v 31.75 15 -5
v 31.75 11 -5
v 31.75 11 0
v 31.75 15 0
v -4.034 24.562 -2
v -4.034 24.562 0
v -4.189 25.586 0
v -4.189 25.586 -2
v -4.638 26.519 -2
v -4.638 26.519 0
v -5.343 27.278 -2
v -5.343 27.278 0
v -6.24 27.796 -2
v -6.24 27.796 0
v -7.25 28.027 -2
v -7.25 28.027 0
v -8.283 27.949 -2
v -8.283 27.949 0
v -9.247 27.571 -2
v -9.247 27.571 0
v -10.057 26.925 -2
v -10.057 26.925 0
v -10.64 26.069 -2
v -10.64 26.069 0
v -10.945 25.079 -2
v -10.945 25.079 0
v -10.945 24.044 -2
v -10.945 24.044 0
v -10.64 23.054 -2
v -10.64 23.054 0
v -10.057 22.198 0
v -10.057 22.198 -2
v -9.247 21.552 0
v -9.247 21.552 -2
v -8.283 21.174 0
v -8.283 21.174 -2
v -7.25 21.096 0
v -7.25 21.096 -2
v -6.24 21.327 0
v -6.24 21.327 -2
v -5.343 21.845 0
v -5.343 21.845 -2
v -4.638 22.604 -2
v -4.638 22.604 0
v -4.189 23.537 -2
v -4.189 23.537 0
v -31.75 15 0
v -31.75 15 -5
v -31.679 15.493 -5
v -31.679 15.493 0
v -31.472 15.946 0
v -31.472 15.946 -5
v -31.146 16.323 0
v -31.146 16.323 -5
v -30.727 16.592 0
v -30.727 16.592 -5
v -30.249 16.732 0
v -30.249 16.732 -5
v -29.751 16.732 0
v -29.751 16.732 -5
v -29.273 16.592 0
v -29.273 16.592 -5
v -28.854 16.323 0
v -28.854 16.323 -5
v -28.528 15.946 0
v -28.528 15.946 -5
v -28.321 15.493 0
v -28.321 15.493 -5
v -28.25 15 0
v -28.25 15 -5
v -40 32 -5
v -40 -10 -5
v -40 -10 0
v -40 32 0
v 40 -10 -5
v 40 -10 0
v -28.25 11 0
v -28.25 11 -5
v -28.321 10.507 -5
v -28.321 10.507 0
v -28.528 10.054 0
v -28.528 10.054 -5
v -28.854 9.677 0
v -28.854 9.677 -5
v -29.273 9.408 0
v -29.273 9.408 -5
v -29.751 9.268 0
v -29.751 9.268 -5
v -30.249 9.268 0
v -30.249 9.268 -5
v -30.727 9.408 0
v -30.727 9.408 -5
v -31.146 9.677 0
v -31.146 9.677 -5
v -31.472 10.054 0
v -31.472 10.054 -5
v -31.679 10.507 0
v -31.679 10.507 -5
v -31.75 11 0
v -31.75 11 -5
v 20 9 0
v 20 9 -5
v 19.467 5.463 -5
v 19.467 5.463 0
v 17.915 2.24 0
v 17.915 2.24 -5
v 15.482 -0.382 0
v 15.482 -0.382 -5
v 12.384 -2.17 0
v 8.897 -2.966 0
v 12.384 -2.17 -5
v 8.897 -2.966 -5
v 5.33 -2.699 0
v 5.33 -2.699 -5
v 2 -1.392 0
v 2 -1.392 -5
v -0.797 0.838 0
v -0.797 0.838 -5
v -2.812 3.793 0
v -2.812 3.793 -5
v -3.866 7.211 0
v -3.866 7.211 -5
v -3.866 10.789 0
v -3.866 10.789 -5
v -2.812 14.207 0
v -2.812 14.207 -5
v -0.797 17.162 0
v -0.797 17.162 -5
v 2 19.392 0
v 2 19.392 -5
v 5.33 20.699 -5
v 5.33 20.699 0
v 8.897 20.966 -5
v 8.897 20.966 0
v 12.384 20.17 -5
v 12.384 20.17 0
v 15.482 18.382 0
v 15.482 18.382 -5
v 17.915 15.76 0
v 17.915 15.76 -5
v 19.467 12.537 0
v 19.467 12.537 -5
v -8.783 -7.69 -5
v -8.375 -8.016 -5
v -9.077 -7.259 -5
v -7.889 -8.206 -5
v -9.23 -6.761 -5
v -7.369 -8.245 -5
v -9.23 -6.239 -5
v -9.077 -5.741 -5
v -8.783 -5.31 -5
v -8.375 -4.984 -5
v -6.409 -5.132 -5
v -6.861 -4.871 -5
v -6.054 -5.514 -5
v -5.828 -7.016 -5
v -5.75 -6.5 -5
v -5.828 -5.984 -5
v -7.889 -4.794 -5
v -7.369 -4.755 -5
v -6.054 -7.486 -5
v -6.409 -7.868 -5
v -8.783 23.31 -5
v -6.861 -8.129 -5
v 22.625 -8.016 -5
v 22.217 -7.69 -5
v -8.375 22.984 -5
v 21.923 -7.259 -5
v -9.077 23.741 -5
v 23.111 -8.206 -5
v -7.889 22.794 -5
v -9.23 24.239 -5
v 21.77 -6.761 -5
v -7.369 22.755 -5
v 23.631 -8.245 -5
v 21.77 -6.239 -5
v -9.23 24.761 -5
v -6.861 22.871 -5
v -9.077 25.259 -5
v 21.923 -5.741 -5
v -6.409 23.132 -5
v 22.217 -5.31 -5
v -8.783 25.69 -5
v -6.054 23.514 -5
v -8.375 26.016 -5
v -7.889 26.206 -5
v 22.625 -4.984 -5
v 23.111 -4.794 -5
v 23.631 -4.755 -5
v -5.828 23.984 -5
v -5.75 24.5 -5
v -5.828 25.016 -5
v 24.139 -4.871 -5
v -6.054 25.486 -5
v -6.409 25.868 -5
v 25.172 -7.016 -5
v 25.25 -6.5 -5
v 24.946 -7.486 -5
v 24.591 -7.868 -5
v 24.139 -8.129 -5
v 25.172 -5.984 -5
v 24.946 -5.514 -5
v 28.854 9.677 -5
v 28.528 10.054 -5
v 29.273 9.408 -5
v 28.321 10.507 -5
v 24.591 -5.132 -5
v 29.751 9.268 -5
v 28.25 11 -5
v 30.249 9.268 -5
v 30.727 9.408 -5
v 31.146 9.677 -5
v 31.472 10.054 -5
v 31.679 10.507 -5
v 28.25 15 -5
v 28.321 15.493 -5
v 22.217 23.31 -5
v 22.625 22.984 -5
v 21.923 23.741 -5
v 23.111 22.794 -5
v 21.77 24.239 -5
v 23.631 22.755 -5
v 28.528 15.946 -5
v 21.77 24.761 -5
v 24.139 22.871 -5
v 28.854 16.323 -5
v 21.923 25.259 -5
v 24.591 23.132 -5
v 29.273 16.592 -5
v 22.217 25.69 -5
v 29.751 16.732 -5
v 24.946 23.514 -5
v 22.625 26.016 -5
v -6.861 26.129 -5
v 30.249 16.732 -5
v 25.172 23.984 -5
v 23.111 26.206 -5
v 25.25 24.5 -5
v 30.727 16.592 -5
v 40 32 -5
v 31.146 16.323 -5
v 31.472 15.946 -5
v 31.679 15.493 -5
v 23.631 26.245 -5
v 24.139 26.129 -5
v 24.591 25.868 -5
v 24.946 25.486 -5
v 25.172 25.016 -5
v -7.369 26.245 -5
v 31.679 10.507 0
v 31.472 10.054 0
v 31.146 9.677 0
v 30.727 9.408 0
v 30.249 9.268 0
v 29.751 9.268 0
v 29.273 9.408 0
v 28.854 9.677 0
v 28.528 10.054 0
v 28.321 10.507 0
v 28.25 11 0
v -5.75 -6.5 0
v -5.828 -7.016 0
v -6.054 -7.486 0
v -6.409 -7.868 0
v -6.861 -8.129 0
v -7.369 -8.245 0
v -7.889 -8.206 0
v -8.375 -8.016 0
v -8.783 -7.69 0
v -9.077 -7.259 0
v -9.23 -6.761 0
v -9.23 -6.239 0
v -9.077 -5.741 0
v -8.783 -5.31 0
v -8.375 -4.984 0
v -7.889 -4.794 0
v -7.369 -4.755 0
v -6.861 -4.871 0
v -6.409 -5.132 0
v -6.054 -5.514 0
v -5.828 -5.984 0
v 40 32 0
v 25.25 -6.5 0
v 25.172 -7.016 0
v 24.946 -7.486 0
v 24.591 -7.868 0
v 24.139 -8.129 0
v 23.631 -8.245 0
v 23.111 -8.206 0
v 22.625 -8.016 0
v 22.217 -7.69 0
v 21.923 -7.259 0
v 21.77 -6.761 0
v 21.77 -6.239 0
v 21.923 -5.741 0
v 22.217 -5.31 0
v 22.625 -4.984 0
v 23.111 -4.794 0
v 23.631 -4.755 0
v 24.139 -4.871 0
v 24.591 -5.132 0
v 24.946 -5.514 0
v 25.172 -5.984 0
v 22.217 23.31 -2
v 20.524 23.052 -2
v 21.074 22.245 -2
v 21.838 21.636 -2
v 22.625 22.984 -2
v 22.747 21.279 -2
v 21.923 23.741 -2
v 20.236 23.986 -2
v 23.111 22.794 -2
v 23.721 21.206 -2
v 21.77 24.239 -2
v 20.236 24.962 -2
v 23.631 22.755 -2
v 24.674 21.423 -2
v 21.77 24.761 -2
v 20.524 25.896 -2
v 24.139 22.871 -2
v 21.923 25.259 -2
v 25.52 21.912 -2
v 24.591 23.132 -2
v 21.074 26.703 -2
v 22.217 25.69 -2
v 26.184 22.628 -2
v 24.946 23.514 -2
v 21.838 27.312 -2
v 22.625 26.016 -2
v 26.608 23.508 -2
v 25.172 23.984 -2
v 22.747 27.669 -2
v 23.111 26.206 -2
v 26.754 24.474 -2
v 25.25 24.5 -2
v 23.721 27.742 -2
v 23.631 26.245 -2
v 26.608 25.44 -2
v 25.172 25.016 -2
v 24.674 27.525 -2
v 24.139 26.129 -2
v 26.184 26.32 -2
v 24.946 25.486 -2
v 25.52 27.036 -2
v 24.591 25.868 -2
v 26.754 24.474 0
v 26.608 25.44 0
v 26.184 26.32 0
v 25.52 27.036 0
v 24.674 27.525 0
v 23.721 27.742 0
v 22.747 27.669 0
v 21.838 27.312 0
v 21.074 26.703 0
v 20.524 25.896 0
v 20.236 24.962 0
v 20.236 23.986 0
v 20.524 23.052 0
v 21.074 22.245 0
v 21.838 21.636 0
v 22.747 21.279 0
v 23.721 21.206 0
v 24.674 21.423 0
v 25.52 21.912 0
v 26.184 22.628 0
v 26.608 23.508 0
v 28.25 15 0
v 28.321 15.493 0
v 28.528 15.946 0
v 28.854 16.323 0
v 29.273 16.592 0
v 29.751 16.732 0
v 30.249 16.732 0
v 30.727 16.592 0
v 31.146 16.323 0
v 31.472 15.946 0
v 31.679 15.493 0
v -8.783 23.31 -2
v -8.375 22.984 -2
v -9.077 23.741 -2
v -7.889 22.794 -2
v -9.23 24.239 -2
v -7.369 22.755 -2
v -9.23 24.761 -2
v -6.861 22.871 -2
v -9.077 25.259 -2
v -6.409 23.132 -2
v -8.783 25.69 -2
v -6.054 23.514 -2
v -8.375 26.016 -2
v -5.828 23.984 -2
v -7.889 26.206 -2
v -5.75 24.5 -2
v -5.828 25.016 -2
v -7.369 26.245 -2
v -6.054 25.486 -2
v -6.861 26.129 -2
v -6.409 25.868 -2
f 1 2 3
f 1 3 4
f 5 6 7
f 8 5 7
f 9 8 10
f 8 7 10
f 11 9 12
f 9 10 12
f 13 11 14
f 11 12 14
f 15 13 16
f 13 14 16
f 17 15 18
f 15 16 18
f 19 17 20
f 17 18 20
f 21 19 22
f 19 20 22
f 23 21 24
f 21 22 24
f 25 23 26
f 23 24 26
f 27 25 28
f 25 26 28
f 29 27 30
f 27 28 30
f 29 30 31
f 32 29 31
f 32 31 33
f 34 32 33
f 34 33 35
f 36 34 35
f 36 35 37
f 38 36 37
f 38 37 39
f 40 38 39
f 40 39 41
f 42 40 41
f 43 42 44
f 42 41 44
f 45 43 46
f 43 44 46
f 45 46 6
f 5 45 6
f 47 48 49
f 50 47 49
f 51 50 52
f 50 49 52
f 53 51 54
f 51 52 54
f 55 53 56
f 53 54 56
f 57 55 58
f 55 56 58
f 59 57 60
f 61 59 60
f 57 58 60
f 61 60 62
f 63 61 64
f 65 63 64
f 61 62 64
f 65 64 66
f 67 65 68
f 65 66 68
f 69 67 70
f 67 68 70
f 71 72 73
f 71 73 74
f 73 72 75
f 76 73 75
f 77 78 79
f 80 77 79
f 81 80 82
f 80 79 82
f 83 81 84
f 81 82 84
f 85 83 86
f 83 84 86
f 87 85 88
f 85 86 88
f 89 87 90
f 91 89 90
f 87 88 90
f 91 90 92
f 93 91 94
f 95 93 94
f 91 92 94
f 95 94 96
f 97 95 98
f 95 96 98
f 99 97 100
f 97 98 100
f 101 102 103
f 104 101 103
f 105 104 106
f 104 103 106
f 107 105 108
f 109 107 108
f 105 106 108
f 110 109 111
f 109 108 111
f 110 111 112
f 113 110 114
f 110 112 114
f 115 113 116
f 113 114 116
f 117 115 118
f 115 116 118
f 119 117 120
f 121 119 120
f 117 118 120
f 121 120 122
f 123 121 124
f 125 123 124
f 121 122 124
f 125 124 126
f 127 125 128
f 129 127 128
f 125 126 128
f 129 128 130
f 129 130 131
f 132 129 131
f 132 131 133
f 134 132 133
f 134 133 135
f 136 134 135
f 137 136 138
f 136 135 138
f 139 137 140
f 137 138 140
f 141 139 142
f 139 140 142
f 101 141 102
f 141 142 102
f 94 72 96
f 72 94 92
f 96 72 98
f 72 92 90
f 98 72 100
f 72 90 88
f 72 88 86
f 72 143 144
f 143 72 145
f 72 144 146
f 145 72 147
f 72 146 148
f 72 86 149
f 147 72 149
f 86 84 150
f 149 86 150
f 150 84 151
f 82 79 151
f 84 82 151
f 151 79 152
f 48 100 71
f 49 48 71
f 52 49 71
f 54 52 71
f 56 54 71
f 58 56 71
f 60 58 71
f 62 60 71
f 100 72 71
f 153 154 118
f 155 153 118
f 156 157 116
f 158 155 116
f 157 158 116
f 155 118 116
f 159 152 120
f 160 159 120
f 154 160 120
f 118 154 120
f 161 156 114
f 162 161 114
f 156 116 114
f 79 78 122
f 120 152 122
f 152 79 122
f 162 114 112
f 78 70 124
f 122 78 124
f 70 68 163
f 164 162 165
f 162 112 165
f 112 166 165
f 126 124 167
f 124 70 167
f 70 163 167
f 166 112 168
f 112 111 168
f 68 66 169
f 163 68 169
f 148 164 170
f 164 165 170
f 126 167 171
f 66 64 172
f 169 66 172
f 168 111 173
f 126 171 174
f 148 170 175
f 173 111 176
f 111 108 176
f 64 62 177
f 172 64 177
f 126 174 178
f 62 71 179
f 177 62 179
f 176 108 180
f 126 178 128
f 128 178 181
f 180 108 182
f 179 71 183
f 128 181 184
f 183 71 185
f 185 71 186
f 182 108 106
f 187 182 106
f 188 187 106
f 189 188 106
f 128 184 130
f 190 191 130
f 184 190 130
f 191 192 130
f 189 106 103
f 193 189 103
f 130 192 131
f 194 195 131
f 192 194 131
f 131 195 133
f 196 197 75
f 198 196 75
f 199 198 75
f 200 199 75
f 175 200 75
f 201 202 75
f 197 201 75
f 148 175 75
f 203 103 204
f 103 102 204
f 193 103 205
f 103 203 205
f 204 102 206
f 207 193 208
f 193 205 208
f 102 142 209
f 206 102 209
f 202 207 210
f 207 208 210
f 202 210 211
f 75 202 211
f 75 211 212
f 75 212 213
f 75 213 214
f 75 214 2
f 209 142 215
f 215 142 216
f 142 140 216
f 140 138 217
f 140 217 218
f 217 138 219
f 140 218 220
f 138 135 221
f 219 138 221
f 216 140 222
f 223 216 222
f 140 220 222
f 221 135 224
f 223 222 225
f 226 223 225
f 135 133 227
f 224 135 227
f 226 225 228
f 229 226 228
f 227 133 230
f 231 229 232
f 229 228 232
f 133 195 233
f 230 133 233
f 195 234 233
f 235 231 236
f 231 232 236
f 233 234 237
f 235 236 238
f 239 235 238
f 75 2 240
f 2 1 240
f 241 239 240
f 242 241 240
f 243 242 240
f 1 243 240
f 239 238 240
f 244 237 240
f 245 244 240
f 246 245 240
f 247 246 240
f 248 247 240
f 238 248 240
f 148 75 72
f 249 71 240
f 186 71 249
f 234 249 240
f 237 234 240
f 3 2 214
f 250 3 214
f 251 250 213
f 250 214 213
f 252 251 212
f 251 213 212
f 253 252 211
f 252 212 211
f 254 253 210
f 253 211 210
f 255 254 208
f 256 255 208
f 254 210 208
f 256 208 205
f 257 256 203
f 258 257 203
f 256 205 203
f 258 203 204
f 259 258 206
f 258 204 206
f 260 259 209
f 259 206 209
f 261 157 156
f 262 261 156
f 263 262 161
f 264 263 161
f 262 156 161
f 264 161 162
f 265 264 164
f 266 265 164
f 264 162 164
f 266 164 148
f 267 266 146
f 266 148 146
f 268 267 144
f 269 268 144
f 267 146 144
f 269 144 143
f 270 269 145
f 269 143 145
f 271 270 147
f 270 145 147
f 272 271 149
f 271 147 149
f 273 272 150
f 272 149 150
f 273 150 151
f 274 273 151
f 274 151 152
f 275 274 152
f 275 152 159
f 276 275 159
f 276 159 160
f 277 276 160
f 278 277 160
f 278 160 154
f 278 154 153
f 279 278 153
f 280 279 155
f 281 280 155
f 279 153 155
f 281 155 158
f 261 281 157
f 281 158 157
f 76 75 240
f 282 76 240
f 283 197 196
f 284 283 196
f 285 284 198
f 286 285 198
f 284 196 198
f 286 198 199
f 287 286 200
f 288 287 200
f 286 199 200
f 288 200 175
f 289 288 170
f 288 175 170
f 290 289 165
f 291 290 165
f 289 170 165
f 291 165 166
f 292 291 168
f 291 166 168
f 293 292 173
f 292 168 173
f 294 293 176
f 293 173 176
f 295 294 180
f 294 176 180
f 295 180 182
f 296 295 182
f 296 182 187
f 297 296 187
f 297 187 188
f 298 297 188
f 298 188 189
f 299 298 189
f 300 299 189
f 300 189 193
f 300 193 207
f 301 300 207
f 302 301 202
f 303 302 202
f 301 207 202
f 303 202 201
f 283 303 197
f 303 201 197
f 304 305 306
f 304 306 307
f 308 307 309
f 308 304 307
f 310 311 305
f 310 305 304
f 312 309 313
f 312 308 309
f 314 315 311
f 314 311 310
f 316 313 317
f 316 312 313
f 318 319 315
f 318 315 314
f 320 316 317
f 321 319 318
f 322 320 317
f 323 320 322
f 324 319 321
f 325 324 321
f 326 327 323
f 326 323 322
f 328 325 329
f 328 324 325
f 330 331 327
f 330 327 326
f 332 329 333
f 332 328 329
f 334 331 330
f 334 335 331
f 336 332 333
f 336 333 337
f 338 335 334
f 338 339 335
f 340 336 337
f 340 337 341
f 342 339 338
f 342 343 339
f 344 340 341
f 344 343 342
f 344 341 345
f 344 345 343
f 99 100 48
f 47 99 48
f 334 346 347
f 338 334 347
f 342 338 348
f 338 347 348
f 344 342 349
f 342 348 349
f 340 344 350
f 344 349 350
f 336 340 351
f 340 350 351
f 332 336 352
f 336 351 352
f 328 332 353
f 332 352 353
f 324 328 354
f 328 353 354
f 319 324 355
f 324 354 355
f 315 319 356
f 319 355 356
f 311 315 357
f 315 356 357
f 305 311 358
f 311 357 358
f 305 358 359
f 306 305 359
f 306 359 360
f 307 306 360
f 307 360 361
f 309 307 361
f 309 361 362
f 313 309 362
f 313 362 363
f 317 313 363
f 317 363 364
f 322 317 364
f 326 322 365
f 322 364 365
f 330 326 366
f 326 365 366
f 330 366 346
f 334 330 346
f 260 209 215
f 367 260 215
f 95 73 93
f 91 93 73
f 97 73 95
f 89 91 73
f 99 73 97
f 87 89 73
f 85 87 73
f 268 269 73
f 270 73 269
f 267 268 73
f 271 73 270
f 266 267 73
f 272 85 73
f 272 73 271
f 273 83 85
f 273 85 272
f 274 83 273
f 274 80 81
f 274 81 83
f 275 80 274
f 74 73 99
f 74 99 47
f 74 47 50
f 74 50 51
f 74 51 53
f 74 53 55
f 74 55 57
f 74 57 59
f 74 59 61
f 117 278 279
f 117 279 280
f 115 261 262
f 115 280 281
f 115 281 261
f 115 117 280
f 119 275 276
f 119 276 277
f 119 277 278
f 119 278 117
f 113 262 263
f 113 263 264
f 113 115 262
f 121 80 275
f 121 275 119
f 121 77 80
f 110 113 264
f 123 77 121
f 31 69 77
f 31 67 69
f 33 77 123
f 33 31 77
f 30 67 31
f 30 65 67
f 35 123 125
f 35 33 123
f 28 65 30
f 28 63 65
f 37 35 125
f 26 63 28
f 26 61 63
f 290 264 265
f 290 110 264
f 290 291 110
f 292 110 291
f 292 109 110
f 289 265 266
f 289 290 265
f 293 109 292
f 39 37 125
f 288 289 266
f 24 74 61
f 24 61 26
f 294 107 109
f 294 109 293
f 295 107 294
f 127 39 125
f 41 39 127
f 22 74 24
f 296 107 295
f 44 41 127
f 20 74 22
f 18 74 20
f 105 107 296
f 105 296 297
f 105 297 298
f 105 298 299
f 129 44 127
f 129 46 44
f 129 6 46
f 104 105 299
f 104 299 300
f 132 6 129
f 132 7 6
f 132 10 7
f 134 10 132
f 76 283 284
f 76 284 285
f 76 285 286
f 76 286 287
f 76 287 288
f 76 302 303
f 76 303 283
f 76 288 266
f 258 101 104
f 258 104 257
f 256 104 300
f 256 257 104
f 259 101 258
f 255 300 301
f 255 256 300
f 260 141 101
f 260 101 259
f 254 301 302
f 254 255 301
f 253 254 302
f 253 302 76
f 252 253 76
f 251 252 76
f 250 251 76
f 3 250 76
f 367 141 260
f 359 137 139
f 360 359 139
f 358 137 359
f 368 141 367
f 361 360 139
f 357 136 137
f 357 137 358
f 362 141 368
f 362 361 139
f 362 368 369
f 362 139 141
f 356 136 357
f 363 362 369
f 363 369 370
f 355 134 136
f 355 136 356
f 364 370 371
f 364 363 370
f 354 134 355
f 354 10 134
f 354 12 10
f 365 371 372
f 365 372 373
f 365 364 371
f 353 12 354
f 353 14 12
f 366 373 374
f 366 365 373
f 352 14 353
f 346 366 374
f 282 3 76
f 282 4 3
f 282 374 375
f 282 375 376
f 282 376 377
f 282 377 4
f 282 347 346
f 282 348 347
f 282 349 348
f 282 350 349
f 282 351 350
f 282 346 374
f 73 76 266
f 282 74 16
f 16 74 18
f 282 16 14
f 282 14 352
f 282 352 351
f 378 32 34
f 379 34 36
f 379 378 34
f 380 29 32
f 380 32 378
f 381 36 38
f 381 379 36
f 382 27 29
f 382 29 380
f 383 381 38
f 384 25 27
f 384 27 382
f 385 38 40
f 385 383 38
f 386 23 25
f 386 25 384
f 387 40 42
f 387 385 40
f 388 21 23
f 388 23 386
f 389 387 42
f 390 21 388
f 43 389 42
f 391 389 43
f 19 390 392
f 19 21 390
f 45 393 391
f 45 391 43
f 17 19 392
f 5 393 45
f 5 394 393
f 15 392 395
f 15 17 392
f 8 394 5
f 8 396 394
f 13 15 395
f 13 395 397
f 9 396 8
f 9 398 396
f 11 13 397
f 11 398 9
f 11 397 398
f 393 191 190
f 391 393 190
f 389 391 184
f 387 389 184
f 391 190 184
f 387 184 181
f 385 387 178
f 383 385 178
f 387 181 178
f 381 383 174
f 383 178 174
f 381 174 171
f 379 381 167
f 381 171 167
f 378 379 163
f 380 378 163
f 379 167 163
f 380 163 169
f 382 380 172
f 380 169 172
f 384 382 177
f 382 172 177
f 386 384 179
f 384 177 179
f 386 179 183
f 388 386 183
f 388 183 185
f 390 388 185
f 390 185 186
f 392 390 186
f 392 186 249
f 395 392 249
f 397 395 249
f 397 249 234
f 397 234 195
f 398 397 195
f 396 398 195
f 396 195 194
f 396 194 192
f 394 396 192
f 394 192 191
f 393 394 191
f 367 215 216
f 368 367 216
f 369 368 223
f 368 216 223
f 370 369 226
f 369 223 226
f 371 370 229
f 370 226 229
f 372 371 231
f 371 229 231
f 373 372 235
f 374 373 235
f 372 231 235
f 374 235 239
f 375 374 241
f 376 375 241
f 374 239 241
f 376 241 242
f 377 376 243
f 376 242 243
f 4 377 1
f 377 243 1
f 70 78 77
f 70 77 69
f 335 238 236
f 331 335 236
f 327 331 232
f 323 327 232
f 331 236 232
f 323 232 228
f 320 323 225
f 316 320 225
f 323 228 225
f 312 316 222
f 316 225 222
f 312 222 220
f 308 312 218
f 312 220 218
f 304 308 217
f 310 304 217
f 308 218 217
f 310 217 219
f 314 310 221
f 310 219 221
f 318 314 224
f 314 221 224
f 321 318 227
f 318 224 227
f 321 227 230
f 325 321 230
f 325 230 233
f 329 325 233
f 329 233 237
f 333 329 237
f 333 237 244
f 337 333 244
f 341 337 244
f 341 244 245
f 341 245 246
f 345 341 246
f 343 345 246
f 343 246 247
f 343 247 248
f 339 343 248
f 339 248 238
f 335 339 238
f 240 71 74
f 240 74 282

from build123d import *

# Parameters (mm, degrees)
SKETCH045_W     = 80
SKETCH045_H     = 42
PAD009_DEPTH    = 5
SKETCH047_R     = 12
SKETCH047_R_2   = 1.75
POCKET022_DEPTH = 5
SKETCH049_R     = 3.474866
SKETCH049_R_2   = 3.27743
POCKET025_DEPTH = 2


with BuildPart() as part:
    # Sketch045 → Pad009 (new body)
    with BuildSketch(Plane.XY):
        with Locations((0, 11)):
            Rectangle(SKETCH045_W, SKETCH045_H)
    extrude(amount=PAD009_DEPTH)

    # Sketch047 (on Face5 of Pad009) → Pocket022 (cut)
    with BuildSketch(Plane(origin=(0, 0, 0), x_dir=(1, 0, 0), z_dir=(0, 0, -1))):
        with Locations((8, -9)):
            Circle(SKETCH047_R)
        with Locations((-7.5, 6.5)):
            Circle(SKETCH047_R_2)
        with Locations((23.5, 6.5)):
            Circle(SKETCH047_R_2)
        with Locations((-7.5, -24.5)):
            Circle(SKETCH047_R_2)
        with Locations((23.5, -24.5)):
            Circle(SKETCH047_R_2)
        with BuildLine():
            ThreePointArc((-28.25, -11), (-30, -9.25), (-31.75, -11))
            Line((-31.75, -11), (-31.75, -15))
            ThreePointArc((-31.75, -15), (-30, -16.75), (-28.25, -15))
            Line((-28.25, -11), (-28.25, -15))
        make_face()
        with BuildLine():
            ThreePointArc((31.75, -11), (30, -9.25), (28.25, -11))
            Line((28.25, -11), (28.25, -15))
            ThreePointArc((28.25, -15), (30, -16.75), (31.75, -15))
            Line((31.75, -11), (31.75, -15))
        make_face()
    extrude(amount=-POCKET022_DEPTH, mode=Mode.SUBTRACT)

    # Sketch049 (on Face5 of Pocket022) → Pocket025 (cut)
    with BuildSketch(Plane.XY.offset(5)):
        with Locations((-7.509294, 24.561527)):
            Circle(SKETCH049_R)
        with Locations((23.476507, 24.473993)):
            Circle(SKETCH049_R_2)
    extrude(amount=-POCKET025_DEPTH, mode=Mode.SUBTRACT)


with BuildPart() as part_1:
    # Body004 placement: moved
    add(part.part.moved(Location((0, 0, -5))))


solid = part_1.part
